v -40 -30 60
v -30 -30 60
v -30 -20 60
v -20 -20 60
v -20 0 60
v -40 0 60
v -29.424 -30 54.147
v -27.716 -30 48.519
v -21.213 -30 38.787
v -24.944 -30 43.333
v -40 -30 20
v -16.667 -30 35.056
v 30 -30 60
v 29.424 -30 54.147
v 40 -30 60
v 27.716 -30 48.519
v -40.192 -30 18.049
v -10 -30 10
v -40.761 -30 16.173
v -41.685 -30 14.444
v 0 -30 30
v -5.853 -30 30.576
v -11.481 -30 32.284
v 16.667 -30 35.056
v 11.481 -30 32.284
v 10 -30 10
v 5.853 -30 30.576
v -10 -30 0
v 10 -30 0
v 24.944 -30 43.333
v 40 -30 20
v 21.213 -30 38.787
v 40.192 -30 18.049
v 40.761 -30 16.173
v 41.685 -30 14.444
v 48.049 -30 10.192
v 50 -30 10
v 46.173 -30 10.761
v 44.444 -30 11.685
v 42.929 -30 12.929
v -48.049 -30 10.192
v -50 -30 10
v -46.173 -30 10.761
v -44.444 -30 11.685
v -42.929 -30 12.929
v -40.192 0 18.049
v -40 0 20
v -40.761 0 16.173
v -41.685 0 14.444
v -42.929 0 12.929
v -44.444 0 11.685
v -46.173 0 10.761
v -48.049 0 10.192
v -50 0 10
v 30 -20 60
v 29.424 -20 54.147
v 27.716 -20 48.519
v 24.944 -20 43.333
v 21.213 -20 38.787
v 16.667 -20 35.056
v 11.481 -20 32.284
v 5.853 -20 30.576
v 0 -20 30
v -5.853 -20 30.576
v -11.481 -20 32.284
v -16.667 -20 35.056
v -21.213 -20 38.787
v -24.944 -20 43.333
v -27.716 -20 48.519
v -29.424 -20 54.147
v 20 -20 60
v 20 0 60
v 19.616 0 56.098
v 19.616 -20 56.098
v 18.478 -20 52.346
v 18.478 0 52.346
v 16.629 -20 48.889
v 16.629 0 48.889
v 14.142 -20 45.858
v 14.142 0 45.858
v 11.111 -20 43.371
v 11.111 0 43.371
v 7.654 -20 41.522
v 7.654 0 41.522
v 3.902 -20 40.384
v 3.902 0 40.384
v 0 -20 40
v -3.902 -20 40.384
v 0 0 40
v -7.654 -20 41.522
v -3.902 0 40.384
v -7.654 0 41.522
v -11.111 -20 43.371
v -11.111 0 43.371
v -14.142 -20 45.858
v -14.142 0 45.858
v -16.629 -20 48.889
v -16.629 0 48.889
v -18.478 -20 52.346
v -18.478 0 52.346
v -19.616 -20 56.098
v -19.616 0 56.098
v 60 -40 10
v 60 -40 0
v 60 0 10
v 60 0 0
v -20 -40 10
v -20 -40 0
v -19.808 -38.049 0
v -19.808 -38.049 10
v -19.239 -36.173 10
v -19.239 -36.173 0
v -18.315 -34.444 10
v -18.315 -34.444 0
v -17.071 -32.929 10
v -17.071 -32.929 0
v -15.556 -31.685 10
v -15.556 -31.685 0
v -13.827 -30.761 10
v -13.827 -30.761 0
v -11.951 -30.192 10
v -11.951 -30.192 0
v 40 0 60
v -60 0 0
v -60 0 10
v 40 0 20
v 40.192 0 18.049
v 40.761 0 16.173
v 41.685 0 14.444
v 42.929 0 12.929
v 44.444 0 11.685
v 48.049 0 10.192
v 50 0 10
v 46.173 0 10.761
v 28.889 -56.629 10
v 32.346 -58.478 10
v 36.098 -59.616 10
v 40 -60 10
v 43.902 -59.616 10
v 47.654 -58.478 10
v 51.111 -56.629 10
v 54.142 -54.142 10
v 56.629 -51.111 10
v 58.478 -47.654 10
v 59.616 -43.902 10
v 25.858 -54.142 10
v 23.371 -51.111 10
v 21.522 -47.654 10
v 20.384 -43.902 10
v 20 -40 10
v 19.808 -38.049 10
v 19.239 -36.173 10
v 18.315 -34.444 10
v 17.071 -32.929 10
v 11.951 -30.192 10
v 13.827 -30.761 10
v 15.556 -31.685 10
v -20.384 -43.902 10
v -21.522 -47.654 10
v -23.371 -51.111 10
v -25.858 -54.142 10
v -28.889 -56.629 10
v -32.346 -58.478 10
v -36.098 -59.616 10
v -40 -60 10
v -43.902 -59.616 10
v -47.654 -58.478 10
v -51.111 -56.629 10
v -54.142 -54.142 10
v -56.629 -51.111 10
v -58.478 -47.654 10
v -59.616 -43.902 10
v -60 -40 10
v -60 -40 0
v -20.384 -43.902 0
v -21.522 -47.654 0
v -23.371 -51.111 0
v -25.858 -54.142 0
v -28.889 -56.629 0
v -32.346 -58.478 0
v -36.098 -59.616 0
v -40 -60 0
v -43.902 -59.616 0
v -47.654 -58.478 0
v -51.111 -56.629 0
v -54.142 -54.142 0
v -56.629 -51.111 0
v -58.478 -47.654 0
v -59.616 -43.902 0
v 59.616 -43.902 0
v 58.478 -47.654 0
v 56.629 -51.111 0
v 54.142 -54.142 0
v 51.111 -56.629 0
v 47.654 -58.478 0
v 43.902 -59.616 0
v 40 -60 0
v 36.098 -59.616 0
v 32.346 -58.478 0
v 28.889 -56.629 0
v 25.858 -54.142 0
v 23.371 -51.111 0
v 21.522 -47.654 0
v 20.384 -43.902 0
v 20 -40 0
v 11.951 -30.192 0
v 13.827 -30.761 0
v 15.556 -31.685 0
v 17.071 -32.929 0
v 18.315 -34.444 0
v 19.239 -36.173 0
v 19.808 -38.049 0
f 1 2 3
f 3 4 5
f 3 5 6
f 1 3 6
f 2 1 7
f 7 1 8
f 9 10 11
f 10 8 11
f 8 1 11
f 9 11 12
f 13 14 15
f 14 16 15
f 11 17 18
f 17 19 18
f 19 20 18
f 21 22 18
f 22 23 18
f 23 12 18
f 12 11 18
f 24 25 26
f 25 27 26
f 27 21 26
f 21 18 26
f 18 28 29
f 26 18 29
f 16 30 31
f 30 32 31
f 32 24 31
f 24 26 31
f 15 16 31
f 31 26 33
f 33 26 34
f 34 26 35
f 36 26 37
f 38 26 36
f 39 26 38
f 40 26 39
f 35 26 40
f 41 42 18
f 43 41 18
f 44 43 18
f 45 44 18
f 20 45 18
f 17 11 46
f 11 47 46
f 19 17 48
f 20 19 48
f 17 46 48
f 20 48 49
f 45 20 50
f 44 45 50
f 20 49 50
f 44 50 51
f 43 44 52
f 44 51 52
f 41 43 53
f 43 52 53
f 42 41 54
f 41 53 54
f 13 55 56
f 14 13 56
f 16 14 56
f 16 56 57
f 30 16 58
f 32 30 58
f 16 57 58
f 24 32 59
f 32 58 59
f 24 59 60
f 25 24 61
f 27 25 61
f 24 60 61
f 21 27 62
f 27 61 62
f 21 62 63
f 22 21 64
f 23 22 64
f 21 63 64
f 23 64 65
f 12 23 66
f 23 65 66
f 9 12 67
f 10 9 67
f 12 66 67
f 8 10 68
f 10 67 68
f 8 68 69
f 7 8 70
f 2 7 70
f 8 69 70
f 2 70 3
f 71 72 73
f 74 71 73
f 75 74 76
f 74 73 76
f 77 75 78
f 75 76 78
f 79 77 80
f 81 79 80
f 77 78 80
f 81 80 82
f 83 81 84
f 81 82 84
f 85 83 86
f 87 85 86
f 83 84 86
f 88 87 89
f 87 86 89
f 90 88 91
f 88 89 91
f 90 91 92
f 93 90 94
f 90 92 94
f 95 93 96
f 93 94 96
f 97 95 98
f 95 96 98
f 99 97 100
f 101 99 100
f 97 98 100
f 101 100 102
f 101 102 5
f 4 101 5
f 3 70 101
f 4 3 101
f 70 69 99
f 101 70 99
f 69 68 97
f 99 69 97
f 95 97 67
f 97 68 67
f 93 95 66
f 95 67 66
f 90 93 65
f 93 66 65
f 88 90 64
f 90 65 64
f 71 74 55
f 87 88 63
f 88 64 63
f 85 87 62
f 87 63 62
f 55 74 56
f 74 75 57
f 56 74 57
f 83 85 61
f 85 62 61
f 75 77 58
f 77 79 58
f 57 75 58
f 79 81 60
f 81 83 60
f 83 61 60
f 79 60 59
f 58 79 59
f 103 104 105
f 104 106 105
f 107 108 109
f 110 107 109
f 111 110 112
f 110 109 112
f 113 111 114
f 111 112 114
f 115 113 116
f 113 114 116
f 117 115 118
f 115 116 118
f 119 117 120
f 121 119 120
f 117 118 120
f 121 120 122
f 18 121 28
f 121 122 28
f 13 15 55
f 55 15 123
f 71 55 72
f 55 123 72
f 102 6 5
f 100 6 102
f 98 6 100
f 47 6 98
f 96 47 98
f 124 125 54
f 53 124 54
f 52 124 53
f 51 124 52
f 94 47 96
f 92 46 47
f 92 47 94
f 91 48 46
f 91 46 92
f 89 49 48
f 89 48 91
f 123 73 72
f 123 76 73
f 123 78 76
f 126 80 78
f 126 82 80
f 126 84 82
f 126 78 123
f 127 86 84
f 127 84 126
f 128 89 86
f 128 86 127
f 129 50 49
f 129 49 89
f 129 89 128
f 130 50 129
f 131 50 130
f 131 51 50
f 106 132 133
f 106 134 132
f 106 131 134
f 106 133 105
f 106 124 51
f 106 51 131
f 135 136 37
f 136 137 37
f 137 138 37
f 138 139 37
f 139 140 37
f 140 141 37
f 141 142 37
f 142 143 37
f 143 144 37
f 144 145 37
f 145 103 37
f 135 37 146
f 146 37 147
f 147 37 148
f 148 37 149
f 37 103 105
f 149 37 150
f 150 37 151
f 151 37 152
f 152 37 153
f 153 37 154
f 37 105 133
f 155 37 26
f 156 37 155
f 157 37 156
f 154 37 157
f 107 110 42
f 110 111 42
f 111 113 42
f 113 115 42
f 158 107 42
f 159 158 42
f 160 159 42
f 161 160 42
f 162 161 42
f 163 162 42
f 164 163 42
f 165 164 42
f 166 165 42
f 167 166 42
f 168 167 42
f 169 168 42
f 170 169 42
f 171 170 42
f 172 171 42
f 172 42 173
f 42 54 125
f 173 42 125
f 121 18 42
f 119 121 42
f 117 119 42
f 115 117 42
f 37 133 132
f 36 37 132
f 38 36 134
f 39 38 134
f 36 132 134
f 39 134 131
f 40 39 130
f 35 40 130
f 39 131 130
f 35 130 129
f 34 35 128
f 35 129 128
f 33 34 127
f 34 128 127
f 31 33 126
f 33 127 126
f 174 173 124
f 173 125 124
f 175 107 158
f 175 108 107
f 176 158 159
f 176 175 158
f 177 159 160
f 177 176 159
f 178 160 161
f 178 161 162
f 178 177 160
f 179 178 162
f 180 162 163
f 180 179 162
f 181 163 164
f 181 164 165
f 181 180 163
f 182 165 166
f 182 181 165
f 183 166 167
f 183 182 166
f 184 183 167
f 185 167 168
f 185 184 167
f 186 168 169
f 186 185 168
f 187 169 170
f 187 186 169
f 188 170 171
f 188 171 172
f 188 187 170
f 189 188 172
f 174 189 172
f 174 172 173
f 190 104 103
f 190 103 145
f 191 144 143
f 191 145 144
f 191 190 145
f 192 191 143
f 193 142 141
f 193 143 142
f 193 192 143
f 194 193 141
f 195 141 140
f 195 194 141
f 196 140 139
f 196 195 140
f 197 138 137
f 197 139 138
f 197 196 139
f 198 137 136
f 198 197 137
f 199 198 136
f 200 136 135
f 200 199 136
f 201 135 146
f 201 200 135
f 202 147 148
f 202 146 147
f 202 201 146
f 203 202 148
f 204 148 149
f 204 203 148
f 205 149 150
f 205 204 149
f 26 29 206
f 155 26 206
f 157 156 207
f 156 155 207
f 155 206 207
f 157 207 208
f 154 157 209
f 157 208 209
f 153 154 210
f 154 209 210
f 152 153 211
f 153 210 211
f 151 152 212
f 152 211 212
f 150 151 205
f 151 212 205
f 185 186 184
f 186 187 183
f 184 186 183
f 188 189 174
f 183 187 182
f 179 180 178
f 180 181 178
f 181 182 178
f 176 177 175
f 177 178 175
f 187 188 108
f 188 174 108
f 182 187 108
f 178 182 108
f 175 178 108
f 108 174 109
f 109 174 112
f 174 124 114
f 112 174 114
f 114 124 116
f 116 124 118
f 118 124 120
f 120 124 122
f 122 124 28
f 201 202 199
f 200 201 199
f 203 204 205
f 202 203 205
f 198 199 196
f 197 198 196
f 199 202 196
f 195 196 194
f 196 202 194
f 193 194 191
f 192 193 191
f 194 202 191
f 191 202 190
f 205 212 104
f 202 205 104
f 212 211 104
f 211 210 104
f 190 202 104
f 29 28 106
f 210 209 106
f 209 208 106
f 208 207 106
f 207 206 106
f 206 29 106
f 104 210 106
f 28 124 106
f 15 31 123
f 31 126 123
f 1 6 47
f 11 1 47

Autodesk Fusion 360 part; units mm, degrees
sketch "Sketch1" plane through (0, 0, 0) normal (0, 1, 0) x (1, 0, 0)
  line L0 (0, 0) -> (60, 0)
  line L1 (60, 0) -> (60, -10)
  line L2 (60, -10) -> (50, -10)
  line L3 (40, -20) -> (40, -60)
  line L4 (-40, -60) -> (-40, -20)
  line L5 (-50, -10) -> (-60, -10)
  line L6 (-60, -10) -> (-60, 0)
  line L7 (-60, 0) -> (0, 0)
  arc A0 (-40, -20) -> (-50, -10) centre (-50, -20) ccw
  arc A1 (50, -10) -> (40, -20) centre (50, -20) ccw
  arc A2 (20, -60) -> (-20, -60) centre (0, -60) ccw
  arc A3 (30, -60) -> (-30, -60) centre (0, -60) ccw
  line L8 (40, -60) -> (20, -60)
  line L9 (-20, -60) -> (-40, -60)
  dimension "d1" = 60
  dimension "d2" = 60
  dimension "d3" = 10
  dimension "d4" = 10
  dimension "d5" = 10
  dimension "d6" = 40
  dimension "d7" = 40
  dimension "d8" = 60
  dimension "d9" = 40
  dimension "d10" = 40
  dimension "d11" = 60
  dimension "d12" = 40
sketch "Sketch2" plane through (0, 0, 0) normal (0, 0, 1) x (1, 0, 0)
  line L0 (60, 0) -> (60, -40)
  line L1 (0, 0) -> (0, -30)
  line L2 (0, -30) -> (10, -30)
  arc A0 (20, -40) -> (60, -40) centre (40, -40) ccw
  line L3 (0, 0) -> (60, 0)
  arc A1 (20, -40) -> (10, -30) centre (10, -40) ccw
  dimension "d18" = 60
  dimension "d21" = 60
  dimension "d22" = 30
  dimension "d23" = 40
  dimension "d24" = 40
  dimension "d26" = 40
  dimension "d27" = 40
  dimension "d28" = 10
  dimension "d33" = 20
extrude "Extrude1" add sketch "Sketch1" against normal blind 30 contours L0 L1 L2 L3 L4 L5 L6 L7 A0 A1 A3 L8 L9
extrude "Extrude2" add sketch "Sketch1" against normal blind 20 contours A2 A3 L8 L9
extrude "Extrude3" add sketch "Sketch2" along normal blind 10
mirror "Mirror1" about plane through (0, 0, 0) normal (1, 0, 0) of "Extrude3"
equation "d9 = d6"
equation "d12 = d6"
